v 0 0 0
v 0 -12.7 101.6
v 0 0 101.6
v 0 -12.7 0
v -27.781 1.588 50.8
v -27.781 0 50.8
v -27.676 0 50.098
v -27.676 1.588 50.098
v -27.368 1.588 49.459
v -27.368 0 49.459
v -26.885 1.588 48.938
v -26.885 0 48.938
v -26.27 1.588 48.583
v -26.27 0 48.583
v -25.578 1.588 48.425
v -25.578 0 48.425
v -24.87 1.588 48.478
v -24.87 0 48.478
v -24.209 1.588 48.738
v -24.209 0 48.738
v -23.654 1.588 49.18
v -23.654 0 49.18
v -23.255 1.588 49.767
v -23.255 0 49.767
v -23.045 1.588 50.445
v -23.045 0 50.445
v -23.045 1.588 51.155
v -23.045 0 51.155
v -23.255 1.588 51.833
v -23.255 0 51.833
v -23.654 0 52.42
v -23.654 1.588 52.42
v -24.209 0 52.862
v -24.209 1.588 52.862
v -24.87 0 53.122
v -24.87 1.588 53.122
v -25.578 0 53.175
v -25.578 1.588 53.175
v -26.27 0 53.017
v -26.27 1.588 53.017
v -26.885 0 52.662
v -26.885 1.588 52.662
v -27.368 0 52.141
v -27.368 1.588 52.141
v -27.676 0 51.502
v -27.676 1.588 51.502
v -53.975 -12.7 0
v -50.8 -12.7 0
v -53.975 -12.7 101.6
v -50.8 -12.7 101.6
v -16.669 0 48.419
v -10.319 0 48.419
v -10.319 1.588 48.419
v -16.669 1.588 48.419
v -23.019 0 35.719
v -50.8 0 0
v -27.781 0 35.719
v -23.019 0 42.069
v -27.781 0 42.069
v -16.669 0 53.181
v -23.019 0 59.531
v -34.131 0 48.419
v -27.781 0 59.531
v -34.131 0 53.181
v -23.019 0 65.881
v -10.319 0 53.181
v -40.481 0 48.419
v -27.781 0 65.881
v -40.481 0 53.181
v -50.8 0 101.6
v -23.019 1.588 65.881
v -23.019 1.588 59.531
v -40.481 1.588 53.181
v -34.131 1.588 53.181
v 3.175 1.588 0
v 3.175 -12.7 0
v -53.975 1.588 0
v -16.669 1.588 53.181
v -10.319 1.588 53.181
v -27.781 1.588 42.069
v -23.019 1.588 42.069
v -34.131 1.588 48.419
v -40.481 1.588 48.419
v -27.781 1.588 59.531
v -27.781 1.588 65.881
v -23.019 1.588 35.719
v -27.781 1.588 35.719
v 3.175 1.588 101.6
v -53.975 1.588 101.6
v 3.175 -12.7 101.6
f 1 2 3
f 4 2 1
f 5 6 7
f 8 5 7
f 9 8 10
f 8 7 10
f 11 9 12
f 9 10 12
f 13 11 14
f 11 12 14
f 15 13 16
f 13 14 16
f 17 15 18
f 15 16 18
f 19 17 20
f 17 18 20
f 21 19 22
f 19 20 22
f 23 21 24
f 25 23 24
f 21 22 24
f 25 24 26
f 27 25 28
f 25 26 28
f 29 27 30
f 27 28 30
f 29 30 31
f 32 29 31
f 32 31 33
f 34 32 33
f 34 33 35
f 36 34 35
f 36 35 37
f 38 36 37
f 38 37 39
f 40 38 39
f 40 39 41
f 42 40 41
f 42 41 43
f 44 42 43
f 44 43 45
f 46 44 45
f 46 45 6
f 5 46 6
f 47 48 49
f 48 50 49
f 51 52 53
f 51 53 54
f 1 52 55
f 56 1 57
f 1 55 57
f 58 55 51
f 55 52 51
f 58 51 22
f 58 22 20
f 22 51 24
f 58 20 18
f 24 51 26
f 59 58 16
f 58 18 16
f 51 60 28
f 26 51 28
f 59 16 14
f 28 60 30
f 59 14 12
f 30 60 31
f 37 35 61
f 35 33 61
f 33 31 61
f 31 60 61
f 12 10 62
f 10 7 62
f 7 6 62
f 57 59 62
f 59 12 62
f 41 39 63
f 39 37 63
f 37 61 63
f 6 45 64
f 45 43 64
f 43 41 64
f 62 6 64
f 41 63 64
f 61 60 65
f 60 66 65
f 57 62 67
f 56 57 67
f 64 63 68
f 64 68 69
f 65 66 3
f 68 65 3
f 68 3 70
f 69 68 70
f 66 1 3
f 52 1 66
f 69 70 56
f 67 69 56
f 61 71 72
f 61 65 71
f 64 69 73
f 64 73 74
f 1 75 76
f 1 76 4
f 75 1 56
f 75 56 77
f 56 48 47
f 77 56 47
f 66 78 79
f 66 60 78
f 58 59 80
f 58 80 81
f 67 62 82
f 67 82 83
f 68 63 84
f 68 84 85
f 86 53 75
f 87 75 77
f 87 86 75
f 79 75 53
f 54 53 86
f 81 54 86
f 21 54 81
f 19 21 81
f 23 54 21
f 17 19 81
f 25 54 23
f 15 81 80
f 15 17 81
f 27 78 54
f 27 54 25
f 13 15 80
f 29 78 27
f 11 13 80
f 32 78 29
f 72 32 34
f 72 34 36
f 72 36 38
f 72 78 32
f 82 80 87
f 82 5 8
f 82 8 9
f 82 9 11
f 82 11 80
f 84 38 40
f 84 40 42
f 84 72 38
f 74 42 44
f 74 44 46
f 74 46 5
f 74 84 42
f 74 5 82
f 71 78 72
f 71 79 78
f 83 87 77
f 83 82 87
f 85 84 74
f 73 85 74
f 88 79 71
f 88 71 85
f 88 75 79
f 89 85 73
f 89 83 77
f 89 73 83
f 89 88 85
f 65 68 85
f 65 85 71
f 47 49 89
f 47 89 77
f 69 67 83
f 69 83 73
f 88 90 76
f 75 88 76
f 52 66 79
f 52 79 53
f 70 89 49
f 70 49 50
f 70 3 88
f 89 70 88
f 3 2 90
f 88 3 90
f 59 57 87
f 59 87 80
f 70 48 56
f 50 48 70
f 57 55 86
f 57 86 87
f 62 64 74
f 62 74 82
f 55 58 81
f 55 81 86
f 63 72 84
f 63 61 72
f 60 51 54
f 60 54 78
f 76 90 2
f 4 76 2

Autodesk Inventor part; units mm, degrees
ref_plane "YZ Plane" through (0, 0, 0) normal (1, 0, 0) x (0, 1, 0)
ref_plane "XZ Plane" through (0, 0, 0) normal (0, 1, 0) x (-1, 0, 0)
ref_plane "XY Plane" through (0, 0, 0) normal (0, 0, 1) x (1, 0, 0)
sketch "Sketch1" plane through (0, 0, 0) normal (0, 1, 0) x (-1, 0, 0)
  line L0 (0, 0) -> (50.8, 0)
  line L1 (50.8, 0) -> (50.8, 101.6)
  line L2 (50.8, 101.6) -> (0, 101.6)
  line L3 (0, 101.6) -> (0, 0)
  line L4 (50.8, 101.6) -> (53.975, 101.6)
  line L5 (53.975, 101.6) -> (53.975, 0)
  line L6 (53.975, 0) -> (50.8, 0)
  line L7 (50.8, 0) -> (50.8, 101.6)
  line L8 (0, 101.6) -> (-3.175, 101.6)
  line L9 (-3.175, 101.6) -> (-3.175, 0)
  line L10 (-3.175, 0) -> (0, 0)
  line L11 (0, 0) -> (0, 101.6)
  circle A0 centre (25.4, 50.8) radius 2.3813
  line L12 (50.8, 53.1813) -> (0, 53.1813)
  line L13 (0, 53.1813) -> (0, 48.4188)
  line L14 (0, 48.4188) -> (50.8, 48.4188)
  line L15 (50.8, 48.4188) -> (50.8, 53.1813)
  line L16 (27.7813, 101.6) -> (23.0188, 101.6)
  line L17 (23.0188, 101.6) -> (23.0188, 0)
  line L18 (23.0188, 0) -> (27.7813, 0)
  line L19 (27.7813, 0) -> (27.7813, 101.6)
  line L20 (27.7812, 65.8812) -> (23.0187, 65.8812)
  line L21 (23.0187, 65.8812) -> (23.0187, 59.5312)
  line L22 (23.0187, 59.5312) -> (27.7812, 59.5312)
  line L23 (27.7812, 59.5312) -> (27.7812, 65.8812)
  line L24 (40.4812, 53.1813) -> (34.1313, 53.1813)
  line L25 (34.1313, 53.1813) -> (34.1313, 48.4188)
  line L26 (34.1313, 48.4188) -> (40.4812, 48.4188)
  line L27 (40.4812, 48.4188) -> (40.4812, 53.1813)
  line L28 (27.7812, 42.0688) -> (23.0187, 42.0688)
  line L29 (23.0187, 42.0688) -> (23.0188, 35.7188)
  line L30 (23.0188, 35.7188) -> (27.7812, 35.7188)
  line L31 (27.7812, 35.7188) -> (27.7812, 42.0688)
  line L32 (16.6687, 53.1813) -> (10.3187, 53.1813)
  line L33 (10.3187, 53.1813) -> (10.3188, 48.4188)
  line L34 (10.3188, 48.4188) -> (16.6688, 48.4188)
  line L35 (16.6688, 48.4188) -> (16.6687, 53.1813)
  point P0 (0, 50.8)
  point P1 (25.4, 53.1813)
  point P2 (25.4, 35.7188)
  point P3 (25.4, 42.0688)
  dimension "d0" = 50.8
  dimension "d1" = 101.6
  dimension "d2" = 3.175
  dimension "d3" = 101.6
  dimension "d4" = 3.175
  dimension "d5" = 101.6
  dimension "d6" = 4.7625
  dimension "d7" = 25.4
  dimension "d8" = 50.8
  dimension "d9" = 4.7625
  dimension "d10" = 4.7625
  dimension "d11" = 2.3813
  dimension "d12" = 2.3813
  dimension "d13" = 6.35
  dimension "d14" = 6.35
  dimension "d15" = 6.35
  dimension "d16" = 6.35
  dimension "d17" = 6.35
  dimension "d18" = 6.35
  dimension "d19" = 6.35
  dimension "d20" = 6.35
extrude "Extrusion1" add sketch "Sketch1" along normal blind 1.5875 contours L3 L14 L17 L0 | L17 L30 L19 L0 | L3 L12 L33 L14 | L19 L14 L1 L0 | L3 L2 L17 L12 | L17 L14 L19 L28 | L35 L12 L17 L14 | L14 L27 L12 L1 | L17 A0 L14 | L2 L19 L20 L17 | L12 L19 L2 L1 | L19 L12 L25 L14 | L14 A0 L19 | L17 L12 A0 | L17 L22 L19 L12 | A0 L12 L19
extrude "Extrusion2" add sketch "Sketch1" along normal blind 1.5875 and the other way blind 12.7 contours L10 L9 L8 L3 | L1 L4 L5 L6
equation "\"d11\" = 0.5 * d6"
equation "\"d12\" = 0.5 * d6"
equation "\"d15\" = d14"
equation "\"d16\" = d15"
properties part number "Guide for 2in box tube"
